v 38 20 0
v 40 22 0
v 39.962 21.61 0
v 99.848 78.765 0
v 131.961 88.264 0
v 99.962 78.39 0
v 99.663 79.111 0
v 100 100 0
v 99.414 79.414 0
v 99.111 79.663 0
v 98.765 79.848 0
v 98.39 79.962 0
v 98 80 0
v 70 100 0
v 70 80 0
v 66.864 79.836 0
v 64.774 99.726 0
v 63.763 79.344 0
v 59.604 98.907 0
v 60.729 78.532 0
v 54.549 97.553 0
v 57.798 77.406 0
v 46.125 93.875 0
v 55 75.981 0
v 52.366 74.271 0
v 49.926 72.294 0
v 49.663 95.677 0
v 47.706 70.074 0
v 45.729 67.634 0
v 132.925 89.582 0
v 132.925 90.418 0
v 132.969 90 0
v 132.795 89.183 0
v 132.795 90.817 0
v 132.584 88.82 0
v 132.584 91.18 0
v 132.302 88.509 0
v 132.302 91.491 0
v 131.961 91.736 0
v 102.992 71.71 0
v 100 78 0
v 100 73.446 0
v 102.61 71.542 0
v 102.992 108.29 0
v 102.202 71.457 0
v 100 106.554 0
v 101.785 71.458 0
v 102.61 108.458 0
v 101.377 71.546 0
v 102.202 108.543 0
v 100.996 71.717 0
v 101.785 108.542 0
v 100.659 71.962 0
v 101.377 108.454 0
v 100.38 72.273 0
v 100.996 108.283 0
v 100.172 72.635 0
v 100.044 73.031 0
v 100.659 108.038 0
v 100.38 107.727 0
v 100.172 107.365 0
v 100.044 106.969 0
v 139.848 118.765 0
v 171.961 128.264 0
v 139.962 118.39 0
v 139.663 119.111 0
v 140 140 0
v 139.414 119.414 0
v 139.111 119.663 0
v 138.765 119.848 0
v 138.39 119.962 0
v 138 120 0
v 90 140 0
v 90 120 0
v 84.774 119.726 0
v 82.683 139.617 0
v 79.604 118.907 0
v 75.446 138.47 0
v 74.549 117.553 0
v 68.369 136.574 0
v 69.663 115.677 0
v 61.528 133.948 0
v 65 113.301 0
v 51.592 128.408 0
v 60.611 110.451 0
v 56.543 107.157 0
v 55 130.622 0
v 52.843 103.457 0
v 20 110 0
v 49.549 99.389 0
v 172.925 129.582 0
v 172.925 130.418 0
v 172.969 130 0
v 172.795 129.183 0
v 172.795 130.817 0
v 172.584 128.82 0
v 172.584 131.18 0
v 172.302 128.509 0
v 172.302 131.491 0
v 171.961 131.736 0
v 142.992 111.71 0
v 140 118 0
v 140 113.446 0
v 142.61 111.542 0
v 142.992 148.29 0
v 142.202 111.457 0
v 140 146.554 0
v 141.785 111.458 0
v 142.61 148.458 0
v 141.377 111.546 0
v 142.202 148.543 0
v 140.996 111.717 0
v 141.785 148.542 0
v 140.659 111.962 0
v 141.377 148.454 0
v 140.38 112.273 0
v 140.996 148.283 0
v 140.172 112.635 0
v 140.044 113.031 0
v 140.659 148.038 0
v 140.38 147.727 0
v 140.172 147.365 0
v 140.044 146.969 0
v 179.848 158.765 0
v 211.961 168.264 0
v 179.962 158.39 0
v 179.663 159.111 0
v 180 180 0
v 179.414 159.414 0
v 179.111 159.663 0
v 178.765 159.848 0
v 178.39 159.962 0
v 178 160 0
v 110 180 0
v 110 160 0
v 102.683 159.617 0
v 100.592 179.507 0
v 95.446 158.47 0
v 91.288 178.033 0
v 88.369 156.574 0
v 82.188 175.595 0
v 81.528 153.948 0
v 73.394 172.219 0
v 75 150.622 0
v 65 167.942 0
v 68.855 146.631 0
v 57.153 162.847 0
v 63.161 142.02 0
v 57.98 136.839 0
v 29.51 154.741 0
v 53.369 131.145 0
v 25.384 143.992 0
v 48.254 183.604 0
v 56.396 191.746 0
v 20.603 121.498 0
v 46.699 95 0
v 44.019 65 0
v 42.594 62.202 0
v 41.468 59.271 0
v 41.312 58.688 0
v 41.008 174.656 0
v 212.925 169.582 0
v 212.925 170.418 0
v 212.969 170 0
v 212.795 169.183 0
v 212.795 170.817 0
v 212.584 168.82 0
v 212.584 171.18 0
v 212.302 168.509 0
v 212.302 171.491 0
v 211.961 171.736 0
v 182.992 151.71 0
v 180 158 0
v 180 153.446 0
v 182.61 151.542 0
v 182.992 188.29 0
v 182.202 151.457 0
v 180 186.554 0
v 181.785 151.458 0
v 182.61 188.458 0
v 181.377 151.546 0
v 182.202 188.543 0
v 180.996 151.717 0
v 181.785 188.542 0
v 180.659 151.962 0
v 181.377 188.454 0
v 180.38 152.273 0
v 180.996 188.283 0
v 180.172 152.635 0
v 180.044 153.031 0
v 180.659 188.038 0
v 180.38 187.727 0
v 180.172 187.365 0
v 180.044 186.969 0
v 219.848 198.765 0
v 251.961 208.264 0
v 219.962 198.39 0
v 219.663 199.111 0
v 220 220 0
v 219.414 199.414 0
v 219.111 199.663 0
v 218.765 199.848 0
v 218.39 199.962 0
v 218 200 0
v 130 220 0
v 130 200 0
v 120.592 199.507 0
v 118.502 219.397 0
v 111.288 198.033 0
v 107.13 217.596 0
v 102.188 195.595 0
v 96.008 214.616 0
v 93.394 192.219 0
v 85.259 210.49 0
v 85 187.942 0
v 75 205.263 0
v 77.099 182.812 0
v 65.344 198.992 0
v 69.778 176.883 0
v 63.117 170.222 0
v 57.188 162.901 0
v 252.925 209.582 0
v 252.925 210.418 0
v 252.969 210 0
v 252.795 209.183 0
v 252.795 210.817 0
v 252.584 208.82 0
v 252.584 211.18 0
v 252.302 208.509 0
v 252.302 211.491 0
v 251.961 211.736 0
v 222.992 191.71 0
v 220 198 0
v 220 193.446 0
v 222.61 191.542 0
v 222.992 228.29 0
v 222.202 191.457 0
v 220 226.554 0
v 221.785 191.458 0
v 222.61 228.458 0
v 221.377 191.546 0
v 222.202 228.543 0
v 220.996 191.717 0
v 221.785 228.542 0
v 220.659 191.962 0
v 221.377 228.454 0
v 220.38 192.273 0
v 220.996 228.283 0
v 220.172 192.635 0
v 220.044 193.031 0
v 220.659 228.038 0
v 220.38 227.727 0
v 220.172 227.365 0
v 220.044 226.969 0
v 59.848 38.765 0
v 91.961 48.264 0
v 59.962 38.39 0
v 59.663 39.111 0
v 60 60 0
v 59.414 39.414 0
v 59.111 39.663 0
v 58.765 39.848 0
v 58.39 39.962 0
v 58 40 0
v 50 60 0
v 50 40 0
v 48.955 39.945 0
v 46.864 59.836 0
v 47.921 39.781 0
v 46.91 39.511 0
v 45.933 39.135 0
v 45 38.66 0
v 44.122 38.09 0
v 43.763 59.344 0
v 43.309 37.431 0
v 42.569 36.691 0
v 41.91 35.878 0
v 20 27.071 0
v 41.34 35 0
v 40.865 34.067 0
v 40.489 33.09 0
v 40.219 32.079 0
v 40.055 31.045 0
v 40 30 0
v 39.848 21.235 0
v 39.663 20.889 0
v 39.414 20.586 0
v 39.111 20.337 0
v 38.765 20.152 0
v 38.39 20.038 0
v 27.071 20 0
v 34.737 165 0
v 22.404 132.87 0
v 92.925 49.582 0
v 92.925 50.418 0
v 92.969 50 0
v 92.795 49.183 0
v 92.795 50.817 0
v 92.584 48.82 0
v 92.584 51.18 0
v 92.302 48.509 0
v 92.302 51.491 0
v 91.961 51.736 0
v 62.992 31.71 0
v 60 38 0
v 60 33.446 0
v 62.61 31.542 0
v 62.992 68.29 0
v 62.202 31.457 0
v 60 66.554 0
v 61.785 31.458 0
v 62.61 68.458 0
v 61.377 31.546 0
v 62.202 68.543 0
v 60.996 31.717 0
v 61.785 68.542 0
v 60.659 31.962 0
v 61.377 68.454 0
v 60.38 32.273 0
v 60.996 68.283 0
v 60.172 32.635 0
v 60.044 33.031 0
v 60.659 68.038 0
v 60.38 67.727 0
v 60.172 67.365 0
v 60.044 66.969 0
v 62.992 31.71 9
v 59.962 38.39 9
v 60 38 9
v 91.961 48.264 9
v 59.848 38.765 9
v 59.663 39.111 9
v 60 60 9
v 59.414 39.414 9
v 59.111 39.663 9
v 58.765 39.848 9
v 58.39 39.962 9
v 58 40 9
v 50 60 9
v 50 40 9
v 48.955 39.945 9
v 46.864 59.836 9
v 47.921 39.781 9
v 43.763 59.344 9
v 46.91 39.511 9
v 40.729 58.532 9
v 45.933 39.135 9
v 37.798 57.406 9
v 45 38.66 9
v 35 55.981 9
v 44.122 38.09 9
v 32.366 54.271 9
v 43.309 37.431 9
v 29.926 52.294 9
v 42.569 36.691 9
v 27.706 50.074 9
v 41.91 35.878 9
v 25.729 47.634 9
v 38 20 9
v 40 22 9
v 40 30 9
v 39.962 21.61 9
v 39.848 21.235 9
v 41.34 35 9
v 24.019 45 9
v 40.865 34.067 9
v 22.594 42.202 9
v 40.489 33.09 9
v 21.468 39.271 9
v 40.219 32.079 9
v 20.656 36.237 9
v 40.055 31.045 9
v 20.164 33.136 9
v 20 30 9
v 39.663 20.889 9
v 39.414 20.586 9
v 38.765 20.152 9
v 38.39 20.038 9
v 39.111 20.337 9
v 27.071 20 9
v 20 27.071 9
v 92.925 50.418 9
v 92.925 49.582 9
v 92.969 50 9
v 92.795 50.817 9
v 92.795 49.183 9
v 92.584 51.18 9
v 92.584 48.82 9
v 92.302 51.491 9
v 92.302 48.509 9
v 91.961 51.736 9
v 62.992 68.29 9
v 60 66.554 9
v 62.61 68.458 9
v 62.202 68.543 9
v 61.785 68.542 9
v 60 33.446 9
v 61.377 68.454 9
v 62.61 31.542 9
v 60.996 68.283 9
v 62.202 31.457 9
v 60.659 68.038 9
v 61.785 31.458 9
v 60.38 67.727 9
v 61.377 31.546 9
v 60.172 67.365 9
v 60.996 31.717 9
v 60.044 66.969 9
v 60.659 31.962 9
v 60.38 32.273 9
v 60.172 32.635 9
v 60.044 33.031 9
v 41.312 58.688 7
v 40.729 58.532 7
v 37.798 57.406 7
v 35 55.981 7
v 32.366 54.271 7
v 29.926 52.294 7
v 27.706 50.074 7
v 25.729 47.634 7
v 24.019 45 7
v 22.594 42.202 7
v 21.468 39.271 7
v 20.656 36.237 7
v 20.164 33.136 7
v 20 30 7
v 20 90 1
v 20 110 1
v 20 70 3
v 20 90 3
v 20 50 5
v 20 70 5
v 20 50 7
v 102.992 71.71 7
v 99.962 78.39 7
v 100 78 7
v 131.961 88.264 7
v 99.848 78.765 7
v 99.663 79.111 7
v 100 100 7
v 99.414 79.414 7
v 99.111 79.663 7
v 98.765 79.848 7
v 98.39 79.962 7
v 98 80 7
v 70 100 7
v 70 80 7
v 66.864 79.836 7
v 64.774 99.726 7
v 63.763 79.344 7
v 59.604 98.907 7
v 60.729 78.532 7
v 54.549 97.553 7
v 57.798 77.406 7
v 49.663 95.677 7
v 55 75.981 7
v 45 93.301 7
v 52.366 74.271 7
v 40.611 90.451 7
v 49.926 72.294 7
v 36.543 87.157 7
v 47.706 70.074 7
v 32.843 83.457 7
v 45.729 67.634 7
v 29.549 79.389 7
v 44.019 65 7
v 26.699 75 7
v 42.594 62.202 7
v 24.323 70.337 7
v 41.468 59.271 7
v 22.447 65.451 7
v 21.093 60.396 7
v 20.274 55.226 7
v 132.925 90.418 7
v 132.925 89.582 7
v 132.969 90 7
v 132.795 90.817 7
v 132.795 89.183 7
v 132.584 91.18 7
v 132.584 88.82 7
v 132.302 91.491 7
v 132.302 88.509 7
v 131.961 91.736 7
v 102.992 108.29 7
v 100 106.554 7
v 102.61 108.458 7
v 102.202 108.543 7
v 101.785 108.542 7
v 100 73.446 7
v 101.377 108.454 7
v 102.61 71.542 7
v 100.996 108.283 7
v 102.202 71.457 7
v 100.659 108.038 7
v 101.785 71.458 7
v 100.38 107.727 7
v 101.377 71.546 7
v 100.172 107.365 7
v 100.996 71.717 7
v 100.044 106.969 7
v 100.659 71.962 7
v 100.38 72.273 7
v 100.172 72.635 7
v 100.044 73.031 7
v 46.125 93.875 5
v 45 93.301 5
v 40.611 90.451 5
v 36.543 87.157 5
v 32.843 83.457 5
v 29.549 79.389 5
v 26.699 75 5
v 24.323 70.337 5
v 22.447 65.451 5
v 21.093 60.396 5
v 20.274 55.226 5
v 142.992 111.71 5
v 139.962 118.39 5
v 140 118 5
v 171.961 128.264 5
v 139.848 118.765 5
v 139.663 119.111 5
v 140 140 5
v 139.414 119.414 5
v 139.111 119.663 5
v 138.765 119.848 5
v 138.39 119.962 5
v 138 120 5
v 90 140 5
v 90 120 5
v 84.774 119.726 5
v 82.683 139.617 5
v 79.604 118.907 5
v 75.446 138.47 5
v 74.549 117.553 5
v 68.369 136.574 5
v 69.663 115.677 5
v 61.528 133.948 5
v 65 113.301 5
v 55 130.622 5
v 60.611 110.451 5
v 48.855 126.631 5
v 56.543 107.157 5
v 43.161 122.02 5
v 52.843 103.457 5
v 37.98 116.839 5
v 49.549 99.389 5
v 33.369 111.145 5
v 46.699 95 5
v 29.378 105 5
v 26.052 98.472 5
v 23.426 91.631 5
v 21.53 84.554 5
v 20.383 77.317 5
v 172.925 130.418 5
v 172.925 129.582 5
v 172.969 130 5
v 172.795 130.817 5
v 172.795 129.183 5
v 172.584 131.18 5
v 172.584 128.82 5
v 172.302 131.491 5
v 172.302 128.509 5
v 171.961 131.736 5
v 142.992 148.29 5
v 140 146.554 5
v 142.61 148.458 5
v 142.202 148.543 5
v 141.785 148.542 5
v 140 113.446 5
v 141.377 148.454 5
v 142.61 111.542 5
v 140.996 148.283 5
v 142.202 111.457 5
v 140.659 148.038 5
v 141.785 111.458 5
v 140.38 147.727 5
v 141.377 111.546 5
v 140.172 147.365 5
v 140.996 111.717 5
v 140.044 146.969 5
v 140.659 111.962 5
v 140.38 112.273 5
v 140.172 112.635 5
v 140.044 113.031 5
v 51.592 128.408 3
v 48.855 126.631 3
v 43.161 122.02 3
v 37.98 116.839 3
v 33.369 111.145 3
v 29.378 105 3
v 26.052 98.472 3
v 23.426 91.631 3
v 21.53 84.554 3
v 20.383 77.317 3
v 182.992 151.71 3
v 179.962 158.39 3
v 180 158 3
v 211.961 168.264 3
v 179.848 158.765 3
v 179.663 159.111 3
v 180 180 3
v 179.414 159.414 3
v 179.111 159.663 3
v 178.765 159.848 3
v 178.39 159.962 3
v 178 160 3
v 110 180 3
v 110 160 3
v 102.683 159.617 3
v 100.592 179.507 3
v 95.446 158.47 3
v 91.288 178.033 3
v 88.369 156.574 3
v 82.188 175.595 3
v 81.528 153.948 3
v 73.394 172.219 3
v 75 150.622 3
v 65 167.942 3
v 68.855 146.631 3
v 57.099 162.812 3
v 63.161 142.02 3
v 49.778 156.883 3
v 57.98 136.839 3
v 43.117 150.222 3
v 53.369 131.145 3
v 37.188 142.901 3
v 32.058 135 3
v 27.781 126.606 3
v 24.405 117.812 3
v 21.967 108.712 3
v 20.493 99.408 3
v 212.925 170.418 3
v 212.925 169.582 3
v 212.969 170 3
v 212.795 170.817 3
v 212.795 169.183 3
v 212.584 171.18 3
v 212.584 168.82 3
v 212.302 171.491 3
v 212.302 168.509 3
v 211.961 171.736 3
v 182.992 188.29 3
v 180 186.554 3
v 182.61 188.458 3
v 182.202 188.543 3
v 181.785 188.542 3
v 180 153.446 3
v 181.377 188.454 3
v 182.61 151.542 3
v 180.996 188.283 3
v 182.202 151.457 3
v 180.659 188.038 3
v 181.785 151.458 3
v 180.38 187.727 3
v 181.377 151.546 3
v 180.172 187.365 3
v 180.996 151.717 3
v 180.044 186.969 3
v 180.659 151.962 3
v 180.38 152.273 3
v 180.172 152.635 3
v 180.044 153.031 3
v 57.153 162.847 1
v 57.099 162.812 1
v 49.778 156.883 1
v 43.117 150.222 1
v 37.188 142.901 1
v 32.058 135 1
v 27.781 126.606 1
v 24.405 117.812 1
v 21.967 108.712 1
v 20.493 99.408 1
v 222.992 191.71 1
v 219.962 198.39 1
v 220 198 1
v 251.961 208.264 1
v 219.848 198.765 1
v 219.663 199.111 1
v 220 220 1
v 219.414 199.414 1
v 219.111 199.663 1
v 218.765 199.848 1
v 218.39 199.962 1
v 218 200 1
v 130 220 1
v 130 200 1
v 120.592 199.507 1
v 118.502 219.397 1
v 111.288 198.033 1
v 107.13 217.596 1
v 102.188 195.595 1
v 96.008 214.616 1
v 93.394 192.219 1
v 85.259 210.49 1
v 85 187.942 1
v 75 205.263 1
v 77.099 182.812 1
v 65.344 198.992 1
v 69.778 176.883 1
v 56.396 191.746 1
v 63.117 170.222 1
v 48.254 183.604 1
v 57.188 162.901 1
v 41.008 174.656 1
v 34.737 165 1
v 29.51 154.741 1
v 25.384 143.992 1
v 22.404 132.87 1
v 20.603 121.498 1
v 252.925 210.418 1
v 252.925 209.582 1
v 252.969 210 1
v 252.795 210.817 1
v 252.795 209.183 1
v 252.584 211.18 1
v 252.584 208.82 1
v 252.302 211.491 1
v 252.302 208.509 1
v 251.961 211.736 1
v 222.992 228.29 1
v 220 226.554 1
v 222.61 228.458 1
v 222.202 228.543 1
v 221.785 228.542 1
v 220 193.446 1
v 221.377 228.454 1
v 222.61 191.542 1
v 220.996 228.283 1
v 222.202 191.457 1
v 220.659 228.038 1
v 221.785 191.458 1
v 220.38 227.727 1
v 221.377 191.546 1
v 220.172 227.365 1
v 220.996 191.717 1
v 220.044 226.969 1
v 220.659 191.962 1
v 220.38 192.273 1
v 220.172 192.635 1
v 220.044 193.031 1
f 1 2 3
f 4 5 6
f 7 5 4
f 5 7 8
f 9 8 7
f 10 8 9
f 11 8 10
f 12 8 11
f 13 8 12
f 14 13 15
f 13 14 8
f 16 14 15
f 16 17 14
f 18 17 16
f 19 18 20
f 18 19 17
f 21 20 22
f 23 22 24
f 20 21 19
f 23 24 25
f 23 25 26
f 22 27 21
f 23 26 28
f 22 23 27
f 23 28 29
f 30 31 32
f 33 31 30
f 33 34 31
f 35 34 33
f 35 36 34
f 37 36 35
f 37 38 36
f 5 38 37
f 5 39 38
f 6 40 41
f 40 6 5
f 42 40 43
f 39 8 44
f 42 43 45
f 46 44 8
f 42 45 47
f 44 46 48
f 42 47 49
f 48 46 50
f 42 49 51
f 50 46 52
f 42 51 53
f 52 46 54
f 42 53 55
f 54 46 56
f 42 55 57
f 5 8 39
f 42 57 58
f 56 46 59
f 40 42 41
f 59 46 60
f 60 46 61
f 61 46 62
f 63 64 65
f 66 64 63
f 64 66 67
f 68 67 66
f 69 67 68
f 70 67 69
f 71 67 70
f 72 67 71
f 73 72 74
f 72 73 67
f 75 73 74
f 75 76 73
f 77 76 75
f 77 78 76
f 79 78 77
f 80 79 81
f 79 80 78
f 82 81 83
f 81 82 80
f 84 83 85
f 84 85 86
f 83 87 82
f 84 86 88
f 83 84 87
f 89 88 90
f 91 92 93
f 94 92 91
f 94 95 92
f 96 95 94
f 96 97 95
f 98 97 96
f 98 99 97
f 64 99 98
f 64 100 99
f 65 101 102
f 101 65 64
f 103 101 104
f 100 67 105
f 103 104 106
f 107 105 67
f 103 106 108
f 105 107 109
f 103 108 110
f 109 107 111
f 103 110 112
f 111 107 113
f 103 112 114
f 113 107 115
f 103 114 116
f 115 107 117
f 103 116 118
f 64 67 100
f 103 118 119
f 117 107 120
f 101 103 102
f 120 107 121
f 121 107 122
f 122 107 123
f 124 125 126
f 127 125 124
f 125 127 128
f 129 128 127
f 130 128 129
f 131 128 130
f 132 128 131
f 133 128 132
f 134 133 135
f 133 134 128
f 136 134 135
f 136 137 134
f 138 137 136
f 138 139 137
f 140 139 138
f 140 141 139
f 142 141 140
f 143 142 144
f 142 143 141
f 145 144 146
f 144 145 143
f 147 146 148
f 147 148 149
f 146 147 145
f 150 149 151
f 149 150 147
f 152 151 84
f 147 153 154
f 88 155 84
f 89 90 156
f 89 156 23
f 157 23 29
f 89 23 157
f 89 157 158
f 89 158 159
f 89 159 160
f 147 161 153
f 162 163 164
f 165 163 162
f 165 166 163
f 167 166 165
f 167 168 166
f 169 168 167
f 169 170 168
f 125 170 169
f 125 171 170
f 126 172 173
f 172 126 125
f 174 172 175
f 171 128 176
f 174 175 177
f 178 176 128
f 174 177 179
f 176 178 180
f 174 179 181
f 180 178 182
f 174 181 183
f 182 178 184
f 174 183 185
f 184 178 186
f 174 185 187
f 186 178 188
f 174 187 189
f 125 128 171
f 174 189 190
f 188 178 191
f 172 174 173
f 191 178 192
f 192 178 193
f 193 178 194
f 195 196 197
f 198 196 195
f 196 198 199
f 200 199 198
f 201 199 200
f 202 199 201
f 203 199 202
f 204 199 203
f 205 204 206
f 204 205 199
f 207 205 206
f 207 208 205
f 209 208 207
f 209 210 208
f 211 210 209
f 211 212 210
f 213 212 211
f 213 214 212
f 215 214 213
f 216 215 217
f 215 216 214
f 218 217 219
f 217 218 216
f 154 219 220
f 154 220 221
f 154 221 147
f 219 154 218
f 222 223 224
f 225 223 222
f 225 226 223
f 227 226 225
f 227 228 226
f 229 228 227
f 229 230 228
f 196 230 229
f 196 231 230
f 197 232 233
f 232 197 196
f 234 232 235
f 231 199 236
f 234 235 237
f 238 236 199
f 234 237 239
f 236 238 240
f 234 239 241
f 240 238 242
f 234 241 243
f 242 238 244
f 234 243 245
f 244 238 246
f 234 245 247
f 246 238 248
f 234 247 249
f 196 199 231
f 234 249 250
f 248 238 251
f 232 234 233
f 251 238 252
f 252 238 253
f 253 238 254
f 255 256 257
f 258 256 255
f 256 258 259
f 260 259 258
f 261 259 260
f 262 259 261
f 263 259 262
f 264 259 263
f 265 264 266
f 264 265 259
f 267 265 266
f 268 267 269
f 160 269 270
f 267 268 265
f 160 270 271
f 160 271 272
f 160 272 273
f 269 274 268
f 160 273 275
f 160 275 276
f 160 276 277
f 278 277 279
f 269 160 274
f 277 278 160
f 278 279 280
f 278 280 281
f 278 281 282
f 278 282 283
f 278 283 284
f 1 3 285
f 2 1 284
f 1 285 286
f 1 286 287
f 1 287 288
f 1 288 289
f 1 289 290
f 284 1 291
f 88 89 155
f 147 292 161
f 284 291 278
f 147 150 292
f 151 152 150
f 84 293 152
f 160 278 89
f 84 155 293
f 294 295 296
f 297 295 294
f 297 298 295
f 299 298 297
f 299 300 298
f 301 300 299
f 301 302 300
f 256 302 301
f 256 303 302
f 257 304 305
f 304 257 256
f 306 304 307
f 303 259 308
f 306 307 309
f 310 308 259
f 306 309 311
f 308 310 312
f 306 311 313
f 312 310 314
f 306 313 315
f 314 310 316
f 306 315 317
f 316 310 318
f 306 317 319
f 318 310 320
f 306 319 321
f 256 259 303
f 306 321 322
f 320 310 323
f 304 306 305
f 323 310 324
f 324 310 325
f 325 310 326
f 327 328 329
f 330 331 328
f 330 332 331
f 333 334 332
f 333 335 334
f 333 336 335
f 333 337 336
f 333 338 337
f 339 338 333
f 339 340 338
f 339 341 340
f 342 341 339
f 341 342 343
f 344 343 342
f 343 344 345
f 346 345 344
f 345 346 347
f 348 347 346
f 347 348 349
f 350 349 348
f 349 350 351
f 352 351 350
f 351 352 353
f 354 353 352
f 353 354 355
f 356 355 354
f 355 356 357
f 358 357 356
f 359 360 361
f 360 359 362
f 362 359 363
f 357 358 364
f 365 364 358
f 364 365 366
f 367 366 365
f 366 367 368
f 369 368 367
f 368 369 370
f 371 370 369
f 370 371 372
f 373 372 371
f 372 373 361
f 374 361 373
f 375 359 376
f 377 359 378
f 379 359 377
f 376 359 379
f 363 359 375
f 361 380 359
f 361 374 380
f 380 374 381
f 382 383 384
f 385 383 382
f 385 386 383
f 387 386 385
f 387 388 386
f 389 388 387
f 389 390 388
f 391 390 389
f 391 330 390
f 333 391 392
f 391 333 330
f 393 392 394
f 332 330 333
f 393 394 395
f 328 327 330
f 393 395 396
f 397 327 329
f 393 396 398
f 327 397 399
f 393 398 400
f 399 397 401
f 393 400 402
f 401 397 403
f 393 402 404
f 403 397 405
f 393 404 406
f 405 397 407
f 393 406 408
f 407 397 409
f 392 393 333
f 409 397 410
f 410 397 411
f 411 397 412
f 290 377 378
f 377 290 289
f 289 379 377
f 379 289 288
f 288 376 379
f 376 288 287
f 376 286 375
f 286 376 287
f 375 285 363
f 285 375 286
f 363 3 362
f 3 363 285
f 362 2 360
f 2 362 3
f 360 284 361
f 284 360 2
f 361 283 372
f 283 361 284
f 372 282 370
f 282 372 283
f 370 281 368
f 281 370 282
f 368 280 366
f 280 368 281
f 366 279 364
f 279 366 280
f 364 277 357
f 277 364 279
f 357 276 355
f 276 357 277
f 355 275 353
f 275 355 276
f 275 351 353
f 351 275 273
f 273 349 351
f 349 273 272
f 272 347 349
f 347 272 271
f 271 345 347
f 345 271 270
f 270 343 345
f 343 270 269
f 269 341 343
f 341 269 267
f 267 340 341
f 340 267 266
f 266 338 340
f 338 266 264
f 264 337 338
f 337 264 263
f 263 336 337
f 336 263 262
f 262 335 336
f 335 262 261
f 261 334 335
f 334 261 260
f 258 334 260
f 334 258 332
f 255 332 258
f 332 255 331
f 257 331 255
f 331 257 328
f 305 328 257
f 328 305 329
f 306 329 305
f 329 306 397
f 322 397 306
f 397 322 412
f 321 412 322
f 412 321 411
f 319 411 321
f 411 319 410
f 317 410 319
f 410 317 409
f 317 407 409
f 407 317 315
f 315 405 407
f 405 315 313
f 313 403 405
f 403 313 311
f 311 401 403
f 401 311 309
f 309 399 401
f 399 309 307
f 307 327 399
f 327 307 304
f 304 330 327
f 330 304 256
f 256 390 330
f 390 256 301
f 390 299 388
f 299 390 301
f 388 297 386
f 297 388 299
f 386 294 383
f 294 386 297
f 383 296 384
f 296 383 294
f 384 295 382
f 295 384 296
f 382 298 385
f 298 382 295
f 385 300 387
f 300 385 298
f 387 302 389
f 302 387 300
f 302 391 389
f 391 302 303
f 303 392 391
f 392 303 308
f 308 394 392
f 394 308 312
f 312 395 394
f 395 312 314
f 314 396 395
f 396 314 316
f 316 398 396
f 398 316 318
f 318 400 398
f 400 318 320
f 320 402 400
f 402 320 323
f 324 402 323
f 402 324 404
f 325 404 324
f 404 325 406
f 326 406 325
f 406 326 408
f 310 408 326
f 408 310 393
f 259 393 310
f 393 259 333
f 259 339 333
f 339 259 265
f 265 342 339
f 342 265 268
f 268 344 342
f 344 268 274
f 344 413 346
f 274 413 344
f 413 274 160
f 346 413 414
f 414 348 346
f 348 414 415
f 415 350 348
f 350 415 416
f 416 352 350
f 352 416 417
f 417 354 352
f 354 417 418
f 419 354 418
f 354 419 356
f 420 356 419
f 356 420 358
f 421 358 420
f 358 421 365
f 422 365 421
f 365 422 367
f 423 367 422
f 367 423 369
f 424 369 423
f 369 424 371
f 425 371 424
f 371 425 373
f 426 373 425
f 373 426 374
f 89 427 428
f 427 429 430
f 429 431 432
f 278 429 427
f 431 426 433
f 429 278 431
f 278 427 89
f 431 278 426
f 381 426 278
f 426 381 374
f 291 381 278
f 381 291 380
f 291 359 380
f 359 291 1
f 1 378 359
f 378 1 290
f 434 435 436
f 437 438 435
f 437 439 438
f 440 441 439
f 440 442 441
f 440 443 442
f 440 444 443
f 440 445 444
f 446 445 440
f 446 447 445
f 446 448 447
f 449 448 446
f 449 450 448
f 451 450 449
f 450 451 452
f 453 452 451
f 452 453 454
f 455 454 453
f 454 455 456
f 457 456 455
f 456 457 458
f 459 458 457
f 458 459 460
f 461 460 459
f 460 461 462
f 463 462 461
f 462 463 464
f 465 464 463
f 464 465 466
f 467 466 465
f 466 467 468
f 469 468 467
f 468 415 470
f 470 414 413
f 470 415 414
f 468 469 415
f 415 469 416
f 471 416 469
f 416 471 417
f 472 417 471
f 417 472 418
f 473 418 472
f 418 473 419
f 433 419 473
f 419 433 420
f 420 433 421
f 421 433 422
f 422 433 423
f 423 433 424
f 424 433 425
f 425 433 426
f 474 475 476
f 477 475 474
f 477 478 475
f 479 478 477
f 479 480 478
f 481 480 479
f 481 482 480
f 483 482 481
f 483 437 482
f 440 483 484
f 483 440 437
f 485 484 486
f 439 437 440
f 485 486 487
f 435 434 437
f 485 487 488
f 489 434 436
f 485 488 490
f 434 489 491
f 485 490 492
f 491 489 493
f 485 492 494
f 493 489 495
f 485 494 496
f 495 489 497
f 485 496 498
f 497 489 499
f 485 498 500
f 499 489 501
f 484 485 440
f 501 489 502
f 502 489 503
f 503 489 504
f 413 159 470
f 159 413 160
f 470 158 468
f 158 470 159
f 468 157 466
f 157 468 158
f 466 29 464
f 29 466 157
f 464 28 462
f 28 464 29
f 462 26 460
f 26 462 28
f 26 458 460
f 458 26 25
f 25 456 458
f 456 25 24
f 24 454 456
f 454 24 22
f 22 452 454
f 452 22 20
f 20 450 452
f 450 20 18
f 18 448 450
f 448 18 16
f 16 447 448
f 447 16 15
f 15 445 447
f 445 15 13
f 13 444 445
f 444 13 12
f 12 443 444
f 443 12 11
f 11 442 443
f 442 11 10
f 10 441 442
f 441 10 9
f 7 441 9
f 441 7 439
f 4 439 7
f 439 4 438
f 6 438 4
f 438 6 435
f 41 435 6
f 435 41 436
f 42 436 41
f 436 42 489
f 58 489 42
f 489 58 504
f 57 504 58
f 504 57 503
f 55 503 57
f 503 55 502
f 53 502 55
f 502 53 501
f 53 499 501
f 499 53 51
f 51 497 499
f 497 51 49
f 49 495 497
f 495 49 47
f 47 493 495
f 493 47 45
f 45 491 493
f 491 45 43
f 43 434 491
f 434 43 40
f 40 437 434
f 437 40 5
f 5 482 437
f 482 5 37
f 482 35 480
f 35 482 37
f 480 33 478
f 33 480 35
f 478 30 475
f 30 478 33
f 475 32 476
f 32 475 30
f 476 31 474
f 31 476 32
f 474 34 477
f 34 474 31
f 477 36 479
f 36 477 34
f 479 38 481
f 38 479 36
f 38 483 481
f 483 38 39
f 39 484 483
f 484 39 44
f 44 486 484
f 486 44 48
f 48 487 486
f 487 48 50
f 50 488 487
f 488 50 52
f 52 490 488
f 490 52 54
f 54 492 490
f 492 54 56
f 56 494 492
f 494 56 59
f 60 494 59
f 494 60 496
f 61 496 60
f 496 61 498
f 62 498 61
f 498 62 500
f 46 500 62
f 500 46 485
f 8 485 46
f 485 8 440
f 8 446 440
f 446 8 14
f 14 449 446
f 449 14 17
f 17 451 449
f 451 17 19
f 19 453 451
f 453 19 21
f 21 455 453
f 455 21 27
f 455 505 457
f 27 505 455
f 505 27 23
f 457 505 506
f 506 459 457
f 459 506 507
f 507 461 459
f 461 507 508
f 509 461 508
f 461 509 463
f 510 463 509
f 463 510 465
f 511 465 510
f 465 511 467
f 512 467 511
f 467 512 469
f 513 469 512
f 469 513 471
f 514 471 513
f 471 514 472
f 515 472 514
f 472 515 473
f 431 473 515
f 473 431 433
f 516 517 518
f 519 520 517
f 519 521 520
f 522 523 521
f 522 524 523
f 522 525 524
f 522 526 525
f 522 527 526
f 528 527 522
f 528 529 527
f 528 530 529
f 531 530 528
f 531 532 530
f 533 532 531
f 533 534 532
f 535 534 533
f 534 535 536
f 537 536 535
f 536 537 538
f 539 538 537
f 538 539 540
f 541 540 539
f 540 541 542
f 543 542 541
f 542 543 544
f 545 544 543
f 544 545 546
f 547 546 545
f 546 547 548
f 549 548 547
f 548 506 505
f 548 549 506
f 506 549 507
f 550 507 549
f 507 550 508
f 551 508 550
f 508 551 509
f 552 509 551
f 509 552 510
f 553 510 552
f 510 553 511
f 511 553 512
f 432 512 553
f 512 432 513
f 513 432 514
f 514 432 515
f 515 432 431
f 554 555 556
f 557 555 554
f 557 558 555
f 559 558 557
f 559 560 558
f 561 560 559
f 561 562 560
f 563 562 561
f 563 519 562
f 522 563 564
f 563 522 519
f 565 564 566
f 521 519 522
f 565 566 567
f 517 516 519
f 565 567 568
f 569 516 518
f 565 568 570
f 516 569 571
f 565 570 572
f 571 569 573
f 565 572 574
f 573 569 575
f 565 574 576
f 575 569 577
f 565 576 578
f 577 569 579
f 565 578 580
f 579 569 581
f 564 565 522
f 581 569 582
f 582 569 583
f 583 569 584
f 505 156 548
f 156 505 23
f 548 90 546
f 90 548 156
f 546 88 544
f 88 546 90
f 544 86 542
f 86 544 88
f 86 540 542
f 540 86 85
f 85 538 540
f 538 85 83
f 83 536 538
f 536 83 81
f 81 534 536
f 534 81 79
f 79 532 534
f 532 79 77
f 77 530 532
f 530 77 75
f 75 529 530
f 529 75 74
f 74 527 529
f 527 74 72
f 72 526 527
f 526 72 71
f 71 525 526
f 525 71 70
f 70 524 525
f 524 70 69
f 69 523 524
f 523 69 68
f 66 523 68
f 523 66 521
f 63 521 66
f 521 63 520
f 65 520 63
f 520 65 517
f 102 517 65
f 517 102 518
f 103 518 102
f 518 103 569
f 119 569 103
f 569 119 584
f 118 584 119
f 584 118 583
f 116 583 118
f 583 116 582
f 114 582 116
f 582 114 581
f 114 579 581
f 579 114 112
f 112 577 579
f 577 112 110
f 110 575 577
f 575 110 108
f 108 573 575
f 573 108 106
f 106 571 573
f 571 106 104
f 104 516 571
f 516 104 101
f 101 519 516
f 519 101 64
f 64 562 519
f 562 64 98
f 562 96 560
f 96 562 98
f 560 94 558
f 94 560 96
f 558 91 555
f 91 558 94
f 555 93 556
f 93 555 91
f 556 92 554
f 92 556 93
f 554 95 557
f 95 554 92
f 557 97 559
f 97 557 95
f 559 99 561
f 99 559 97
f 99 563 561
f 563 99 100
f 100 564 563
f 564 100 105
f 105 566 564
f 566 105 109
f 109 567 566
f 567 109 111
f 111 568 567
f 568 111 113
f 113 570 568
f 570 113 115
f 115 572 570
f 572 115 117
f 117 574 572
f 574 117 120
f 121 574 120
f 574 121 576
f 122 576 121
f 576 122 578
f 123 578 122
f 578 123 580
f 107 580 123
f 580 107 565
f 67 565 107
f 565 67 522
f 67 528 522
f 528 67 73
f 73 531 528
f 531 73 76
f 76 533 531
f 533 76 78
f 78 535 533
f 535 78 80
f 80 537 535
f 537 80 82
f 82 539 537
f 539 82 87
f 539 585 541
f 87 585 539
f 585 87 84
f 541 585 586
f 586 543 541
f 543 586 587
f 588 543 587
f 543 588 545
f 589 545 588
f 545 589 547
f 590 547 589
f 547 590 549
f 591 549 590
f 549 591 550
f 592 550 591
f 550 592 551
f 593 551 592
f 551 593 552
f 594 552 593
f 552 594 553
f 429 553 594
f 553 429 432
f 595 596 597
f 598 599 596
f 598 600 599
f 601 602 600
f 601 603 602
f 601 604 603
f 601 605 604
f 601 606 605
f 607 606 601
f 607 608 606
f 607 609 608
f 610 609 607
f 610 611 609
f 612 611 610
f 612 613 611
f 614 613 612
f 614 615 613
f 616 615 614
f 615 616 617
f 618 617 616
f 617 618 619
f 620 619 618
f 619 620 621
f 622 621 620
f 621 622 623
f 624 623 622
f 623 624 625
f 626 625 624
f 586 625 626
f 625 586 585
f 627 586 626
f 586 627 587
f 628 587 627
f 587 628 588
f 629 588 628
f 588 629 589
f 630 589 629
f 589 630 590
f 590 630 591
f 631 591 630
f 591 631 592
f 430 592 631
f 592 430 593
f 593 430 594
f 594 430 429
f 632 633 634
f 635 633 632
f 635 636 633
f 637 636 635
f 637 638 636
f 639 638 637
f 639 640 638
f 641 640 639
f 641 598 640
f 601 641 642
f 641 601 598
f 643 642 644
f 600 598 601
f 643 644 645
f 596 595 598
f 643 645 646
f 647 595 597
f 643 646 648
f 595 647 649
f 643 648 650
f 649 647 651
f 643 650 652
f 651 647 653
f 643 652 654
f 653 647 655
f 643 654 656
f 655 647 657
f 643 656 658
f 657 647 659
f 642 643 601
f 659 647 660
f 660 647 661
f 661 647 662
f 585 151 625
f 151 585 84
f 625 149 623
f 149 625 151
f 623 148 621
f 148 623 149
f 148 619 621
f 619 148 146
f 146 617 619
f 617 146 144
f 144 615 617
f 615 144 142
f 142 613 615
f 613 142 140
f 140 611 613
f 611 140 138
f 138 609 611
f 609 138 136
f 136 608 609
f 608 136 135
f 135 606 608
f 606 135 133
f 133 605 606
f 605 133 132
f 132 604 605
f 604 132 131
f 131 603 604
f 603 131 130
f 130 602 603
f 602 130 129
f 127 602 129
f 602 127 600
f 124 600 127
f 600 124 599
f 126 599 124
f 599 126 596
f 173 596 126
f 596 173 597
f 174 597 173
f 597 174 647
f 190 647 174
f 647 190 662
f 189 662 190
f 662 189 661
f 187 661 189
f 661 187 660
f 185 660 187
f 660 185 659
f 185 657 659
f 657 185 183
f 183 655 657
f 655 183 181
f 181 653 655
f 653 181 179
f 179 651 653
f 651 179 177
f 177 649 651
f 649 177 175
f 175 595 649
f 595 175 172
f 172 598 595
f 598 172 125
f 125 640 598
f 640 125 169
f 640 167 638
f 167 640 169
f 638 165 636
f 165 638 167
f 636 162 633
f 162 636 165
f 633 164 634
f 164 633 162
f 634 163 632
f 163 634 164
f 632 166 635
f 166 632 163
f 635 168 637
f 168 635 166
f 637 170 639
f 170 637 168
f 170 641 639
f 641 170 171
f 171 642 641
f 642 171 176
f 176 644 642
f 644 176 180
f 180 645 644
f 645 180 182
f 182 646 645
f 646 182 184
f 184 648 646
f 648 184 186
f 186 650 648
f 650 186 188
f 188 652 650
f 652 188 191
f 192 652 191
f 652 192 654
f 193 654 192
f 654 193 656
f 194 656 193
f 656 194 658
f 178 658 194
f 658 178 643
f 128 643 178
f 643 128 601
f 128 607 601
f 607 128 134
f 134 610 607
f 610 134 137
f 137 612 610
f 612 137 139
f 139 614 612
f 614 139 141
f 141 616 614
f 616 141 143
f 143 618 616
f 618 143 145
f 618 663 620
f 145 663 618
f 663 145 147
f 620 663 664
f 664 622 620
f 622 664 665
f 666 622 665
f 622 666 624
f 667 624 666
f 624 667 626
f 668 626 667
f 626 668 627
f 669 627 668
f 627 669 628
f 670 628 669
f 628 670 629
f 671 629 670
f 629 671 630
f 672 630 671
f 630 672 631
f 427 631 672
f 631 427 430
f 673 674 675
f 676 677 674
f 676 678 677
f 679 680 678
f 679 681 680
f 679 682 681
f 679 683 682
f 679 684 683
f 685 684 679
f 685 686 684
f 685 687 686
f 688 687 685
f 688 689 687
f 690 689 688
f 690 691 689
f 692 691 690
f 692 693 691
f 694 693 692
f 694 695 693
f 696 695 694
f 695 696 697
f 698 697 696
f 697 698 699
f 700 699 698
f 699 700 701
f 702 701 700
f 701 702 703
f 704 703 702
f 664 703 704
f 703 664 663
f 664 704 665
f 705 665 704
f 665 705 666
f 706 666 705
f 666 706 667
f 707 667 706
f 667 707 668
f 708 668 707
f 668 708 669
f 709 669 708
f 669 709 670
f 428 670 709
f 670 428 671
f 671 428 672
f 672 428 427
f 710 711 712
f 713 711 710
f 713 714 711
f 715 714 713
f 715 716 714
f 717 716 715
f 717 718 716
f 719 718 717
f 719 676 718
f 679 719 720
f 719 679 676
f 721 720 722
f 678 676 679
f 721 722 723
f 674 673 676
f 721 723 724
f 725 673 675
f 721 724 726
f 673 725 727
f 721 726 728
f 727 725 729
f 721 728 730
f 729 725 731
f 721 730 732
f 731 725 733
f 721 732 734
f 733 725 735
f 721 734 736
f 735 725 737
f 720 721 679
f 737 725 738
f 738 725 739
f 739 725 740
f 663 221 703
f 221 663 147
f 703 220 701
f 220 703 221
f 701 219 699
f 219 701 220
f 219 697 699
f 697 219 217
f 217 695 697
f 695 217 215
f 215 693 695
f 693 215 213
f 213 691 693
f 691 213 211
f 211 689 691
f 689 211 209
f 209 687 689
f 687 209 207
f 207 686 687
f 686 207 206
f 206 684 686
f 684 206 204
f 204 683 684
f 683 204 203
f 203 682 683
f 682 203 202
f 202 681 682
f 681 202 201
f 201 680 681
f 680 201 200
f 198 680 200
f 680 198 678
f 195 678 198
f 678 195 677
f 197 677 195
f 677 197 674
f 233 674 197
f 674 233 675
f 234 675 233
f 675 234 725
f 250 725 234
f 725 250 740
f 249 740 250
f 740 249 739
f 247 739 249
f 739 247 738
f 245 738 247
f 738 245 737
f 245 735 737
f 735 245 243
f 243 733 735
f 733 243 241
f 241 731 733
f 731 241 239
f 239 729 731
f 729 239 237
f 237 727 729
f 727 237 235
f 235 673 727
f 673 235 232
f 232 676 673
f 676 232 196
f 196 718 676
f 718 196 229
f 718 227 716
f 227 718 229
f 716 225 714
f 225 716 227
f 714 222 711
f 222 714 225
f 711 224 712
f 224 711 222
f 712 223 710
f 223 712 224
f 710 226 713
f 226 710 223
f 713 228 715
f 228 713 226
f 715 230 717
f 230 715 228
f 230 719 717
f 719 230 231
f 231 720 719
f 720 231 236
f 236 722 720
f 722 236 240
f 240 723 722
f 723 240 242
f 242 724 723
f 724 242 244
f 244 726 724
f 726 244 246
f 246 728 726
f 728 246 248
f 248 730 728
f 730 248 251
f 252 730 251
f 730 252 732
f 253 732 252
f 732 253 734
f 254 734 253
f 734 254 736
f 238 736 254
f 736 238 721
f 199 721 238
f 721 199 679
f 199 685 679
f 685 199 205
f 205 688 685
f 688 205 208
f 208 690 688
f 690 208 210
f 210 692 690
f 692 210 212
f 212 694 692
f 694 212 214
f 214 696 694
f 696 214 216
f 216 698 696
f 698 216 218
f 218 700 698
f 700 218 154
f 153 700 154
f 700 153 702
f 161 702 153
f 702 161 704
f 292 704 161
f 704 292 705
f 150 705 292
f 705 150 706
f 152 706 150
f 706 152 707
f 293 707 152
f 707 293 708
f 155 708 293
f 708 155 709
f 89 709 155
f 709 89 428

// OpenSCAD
include <pathbuilder.scad>

col = [[0.109, 0.277, 0.715],[0.996, 0.449, 0.707],[0.832, 0.113, 0.102],[0.953, 0.363, 0.137],[0.980, 0.789, 0.066]];
//  Code with params
//  Here parameters and the loop variable are used directly in pathbuilder commands resulting in multiple arrows branching out.

aw = 20;                //  arrow shaft width
$fa=6;                  //  new segment when angle reaches 6 degrees
$fs=0.4;                //  don't make a new segment when it is smaller than 0.4 units

for (al=[10:20:90]) color(col[(al-10)/20])
    translate([20, 20, 0])
    linear_extrude(10-al/10)
    m(0,0)              //  start at origin
    chamfer(10)         //  apply a chamfer of 10 long at this point
    h(aw)               //  move horizontal along by given distance
    fillet(2)           //  apply a fillet with given radius
    v(al*2)             //  move vertical along by given distance
    fillet(al)          //  apply a fillet with given radius
    h(al*2)             //  move horizontal along by given distance
    fillet(2)           //  apply a fillet with given radius
    v(-aw/2)            //  move vertical along by given distance
    fillet(2)           //  apply a fillet with given radius
    l(35,aw)            //  move along by given x and y distance
    fillet(2)           //  apply a fillet with given radius
    l(-35, aw)          //  move along by given x and y distance
    fillet(2)           //  apply a fillet with given radius
    v(-aw/2)            //  move vertical along by given distance
    H(0)                //  move horizontal along to given x coordinate
    fillet(al+20);      //  apply a fillet with given radius
